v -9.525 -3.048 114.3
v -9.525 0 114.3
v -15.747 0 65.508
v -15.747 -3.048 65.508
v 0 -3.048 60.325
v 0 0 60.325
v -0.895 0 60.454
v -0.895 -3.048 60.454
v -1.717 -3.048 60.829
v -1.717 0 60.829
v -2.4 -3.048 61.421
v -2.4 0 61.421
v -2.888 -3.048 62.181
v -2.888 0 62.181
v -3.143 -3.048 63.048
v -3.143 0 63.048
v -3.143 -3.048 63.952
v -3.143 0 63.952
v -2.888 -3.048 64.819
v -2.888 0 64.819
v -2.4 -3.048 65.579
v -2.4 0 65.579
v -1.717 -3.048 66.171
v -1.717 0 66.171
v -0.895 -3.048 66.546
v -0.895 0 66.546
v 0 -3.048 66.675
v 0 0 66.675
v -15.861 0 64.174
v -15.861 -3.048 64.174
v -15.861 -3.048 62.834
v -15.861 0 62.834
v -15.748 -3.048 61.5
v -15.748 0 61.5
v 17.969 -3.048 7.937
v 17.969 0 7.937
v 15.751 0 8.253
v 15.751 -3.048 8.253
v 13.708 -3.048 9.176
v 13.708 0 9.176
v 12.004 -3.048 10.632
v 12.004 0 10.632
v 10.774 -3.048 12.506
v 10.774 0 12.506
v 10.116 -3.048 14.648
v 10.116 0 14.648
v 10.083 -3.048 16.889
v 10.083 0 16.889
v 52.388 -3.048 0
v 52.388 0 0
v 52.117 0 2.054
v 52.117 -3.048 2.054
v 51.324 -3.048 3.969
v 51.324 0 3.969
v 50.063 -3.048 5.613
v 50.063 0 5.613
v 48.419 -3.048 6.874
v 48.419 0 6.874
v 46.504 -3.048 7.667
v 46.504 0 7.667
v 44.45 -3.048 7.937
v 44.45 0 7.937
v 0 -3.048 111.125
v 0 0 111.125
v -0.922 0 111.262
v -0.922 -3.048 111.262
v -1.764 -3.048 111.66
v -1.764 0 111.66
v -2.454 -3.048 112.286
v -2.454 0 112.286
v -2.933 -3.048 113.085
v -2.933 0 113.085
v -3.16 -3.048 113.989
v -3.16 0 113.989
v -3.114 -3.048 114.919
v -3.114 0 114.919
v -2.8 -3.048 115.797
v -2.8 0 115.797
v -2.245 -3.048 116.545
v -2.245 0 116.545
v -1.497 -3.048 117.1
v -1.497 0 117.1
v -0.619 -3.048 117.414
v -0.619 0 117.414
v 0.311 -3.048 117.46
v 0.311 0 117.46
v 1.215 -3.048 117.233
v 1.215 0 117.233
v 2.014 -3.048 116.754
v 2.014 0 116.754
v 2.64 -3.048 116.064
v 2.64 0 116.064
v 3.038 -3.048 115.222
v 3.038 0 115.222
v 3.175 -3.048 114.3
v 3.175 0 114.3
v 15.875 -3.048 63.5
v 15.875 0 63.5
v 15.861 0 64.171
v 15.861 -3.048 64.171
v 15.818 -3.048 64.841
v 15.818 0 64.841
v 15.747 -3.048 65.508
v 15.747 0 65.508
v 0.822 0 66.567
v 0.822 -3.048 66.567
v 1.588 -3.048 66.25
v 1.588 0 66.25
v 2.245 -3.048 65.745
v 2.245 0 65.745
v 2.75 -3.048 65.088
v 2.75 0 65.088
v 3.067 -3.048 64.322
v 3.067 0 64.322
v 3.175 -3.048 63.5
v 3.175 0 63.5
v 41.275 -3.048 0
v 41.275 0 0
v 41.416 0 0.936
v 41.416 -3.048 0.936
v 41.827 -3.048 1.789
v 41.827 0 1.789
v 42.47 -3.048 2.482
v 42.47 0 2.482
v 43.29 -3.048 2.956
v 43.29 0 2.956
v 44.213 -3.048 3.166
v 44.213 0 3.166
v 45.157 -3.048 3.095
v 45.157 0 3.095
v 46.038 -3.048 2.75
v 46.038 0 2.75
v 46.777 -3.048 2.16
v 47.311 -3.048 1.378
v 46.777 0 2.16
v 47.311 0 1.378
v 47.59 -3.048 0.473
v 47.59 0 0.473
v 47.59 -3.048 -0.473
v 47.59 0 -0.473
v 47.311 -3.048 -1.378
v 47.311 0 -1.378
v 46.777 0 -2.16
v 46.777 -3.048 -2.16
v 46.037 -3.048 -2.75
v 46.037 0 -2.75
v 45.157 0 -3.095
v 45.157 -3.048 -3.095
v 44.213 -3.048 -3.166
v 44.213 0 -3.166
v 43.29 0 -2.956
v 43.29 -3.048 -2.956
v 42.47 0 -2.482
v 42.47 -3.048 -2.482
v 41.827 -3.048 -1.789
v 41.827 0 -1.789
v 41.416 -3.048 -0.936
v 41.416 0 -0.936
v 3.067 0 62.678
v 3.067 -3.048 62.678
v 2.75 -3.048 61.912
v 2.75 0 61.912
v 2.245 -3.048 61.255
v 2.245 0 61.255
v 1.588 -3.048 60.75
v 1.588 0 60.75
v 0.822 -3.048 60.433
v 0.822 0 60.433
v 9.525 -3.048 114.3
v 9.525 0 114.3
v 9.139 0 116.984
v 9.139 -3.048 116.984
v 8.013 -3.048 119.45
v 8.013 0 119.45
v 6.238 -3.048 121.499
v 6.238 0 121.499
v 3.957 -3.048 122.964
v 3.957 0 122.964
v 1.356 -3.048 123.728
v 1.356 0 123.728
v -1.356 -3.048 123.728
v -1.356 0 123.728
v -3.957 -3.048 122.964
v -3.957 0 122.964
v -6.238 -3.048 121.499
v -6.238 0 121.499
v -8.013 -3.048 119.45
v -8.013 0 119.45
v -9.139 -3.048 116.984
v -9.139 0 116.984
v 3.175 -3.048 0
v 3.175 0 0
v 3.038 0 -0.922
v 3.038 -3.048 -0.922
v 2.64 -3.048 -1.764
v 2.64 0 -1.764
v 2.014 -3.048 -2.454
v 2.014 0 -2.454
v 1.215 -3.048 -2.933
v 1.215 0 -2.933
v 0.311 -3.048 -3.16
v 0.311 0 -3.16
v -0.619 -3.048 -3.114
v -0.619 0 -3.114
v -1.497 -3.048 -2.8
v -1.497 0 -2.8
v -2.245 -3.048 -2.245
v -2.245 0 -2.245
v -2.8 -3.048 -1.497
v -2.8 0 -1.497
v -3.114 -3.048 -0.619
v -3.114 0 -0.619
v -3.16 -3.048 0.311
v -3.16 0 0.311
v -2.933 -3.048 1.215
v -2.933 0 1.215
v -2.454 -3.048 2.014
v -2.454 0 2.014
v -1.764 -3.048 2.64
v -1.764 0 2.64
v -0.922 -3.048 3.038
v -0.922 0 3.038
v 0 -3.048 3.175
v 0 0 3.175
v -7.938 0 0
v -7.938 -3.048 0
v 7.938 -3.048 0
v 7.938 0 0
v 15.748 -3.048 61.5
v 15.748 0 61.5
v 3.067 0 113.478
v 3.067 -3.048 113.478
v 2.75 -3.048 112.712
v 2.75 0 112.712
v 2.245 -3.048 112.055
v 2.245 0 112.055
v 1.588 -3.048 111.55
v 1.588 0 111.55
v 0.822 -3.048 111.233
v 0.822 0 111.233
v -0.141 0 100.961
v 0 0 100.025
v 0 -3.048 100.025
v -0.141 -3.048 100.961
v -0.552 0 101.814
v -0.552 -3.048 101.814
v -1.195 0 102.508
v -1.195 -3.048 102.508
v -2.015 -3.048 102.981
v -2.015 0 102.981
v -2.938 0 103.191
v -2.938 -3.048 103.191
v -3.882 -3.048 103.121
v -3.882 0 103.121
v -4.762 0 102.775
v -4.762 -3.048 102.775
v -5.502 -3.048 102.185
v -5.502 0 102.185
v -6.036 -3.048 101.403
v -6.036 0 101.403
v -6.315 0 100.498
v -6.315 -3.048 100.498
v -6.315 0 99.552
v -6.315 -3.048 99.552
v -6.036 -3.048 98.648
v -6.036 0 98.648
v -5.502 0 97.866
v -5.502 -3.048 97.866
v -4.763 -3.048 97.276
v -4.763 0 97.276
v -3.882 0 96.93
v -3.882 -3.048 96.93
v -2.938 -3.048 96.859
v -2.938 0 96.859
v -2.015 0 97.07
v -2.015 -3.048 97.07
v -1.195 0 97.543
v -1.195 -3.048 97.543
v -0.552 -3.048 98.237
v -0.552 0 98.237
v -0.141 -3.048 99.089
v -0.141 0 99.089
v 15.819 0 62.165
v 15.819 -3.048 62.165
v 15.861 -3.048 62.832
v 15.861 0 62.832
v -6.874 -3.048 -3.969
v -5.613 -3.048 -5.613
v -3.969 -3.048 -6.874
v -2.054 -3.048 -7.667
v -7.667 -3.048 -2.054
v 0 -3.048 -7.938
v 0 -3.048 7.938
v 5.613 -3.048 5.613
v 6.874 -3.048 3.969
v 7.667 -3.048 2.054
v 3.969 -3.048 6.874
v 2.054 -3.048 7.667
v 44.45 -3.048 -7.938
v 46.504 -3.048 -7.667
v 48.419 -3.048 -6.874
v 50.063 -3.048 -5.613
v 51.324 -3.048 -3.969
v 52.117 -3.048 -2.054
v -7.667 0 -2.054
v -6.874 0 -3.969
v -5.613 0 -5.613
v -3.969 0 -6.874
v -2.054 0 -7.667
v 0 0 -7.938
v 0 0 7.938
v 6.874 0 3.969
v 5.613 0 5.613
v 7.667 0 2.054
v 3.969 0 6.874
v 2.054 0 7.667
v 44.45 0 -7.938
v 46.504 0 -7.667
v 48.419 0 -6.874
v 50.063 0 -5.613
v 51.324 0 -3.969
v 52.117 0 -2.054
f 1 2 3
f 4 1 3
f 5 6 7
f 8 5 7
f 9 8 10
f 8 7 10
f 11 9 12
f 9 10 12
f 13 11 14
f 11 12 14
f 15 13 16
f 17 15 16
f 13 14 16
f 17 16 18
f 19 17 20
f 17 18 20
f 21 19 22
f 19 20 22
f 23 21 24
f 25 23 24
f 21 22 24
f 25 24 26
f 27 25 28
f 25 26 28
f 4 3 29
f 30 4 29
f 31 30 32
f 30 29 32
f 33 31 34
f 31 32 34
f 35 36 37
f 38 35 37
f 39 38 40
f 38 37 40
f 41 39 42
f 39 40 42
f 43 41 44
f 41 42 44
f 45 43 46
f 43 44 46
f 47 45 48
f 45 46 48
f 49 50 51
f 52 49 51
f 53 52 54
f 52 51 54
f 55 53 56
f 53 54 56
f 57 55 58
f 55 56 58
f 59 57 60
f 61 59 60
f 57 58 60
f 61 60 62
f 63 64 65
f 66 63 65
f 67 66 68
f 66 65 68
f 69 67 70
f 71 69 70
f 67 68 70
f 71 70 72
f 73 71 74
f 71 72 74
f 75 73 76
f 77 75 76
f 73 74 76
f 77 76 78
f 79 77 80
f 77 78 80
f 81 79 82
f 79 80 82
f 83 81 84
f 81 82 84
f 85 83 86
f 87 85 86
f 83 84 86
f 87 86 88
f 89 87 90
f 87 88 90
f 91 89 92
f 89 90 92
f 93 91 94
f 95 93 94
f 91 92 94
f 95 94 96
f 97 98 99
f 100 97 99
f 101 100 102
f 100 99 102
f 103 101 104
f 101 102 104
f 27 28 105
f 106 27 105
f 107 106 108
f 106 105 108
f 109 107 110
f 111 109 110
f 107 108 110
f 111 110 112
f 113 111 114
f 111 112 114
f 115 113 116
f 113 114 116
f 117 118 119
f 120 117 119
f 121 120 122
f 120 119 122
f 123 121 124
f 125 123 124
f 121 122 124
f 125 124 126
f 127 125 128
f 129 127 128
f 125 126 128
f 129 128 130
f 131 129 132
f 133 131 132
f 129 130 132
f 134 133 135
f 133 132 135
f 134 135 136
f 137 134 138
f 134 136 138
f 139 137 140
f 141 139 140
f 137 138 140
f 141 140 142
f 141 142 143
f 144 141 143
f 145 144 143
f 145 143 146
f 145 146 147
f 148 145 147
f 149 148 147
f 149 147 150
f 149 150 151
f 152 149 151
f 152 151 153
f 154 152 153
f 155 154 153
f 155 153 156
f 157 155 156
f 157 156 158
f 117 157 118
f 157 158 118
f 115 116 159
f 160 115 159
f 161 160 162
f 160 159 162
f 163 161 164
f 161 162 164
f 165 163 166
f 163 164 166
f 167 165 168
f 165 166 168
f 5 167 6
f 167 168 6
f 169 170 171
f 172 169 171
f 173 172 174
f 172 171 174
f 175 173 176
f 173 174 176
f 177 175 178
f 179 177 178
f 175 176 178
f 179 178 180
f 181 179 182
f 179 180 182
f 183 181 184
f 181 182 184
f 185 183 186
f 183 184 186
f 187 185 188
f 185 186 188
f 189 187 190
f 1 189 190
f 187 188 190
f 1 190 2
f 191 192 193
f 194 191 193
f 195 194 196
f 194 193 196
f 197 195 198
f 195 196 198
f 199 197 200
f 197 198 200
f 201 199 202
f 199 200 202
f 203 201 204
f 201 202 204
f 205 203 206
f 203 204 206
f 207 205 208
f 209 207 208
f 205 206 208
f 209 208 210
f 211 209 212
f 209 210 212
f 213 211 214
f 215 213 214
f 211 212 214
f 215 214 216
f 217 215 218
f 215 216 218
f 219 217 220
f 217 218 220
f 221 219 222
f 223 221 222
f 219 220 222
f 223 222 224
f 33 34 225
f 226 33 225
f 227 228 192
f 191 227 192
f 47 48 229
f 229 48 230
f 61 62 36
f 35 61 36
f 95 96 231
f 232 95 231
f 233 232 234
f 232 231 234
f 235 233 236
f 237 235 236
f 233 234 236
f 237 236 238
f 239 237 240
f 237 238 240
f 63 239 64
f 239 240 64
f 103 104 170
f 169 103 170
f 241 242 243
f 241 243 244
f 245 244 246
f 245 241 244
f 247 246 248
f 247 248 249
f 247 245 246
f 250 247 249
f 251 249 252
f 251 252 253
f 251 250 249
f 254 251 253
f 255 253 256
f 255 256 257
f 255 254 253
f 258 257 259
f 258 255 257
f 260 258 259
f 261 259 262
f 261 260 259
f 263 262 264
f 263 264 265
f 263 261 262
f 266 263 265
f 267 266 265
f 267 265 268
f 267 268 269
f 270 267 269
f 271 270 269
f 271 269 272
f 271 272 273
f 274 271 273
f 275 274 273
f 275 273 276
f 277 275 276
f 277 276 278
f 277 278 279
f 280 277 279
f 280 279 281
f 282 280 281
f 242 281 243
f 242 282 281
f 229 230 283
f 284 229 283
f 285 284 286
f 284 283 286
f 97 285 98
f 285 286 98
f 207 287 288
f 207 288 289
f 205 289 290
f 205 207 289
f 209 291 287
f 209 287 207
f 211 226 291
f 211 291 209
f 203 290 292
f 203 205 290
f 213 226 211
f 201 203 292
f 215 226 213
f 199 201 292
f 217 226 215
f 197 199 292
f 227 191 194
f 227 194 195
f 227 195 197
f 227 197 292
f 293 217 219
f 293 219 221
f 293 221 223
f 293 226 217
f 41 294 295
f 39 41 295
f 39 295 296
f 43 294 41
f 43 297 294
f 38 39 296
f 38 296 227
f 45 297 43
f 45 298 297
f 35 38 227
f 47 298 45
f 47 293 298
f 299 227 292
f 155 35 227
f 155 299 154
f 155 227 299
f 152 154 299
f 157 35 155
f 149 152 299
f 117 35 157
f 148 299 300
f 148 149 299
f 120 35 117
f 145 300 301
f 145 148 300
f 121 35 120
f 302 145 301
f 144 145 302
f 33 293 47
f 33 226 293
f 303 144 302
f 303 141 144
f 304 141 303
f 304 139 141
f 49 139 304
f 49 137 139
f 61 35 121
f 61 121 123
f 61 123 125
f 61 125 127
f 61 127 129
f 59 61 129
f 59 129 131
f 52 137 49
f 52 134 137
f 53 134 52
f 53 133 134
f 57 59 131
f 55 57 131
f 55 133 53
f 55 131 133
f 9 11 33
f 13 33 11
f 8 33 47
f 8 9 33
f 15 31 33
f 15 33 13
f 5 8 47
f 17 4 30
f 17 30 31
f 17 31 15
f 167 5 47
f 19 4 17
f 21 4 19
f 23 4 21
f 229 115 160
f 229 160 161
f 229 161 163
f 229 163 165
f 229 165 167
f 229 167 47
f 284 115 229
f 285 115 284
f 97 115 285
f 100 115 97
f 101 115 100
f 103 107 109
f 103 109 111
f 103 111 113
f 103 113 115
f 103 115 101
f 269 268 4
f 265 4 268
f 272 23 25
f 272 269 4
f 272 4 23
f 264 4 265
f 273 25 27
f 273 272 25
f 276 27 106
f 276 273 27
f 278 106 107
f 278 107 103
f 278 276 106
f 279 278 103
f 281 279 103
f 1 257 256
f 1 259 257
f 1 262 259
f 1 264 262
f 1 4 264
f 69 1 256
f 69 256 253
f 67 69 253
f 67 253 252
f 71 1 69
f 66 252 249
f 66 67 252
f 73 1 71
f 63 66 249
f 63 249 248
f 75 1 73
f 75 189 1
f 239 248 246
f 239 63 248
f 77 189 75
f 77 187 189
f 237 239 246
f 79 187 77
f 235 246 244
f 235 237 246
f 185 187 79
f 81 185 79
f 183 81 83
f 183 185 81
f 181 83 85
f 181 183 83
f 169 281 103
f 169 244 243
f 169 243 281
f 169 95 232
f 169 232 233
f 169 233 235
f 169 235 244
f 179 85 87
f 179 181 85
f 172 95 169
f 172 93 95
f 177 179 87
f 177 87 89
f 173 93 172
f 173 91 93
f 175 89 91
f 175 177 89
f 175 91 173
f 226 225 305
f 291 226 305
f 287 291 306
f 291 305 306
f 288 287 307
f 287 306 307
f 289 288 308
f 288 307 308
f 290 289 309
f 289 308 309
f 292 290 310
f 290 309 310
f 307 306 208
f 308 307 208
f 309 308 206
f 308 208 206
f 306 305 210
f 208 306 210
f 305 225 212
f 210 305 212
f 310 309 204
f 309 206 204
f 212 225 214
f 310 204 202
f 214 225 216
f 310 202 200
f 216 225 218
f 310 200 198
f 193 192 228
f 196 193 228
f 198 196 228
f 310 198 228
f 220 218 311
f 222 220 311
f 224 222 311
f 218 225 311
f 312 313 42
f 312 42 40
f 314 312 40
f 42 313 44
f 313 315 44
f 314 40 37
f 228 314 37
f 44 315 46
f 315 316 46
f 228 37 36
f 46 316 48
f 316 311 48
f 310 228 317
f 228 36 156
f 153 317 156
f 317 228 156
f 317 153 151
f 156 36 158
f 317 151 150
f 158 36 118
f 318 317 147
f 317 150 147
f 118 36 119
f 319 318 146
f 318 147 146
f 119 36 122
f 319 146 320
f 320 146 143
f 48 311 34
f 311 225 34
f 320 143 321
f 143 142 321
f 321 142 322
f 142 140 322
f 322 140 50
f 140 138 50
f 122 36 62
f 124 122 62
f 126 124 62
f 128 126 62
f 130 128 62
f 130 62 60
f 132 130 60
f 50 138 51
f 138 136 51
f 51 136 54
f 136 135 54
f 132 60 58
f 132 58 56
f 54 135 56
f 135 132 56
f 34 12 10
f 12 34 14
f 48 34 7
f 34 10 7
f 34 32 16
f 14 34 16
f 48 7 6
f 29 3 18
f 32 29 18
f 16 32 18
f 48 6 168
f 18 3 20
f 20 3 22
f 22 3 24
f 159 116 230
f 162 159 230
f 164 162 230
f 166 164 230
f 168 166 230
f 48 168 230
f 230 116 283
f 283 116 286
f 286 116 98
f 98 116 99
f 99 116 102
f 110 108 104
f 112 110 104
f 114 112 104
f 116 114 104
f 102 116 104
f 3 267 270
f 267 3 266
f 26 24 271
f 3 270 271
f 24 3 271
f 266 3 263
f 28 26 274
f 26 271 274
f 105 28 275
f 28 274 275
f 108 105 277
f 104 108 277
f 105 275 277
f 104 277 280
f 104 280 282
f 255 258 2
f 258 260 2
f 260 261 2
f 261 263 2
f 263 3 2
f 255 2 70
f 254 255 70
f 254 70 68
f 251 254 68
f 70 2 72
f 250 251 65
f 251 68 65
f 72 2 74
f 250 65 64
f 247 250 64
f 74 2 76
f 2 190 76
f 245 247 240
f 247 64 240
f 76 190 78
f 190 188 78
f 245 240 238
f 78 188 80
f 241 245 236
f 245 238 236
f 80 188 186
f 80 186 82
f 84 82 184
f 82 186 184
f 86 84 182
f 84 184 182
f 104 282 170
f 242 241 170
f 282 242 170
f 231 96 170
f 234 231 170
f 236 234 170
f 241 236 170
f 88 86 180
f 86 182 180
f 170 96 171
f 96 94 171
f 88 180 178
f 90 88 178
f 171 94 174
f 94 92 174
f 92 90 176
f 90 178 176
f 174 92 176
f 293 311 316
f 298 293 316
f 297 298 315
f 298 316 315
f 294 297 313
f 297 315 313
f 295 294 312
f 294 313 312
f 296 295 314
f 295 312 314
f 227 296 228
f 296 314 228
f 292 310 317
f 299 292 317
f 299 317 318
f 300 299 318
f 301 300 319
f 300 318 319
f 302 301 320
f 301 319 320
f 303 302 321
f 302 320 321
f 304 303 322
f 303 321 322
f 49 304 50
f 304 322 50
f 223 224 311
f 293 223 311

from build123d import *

# Parameters (mm, degrees)
F0_R     = 3.175
F1_DEPTH = 3.048


with BuildPart() as f1:
    # F0 (on Front) → F1 (new body)
    with BuildSketch(Plane.XZ):
        with BuildLine():
            ThreePointArc((3.175, 0), (-2.2450640303, -2.2450640303), (0, 3.175))
            Line((0, 3.175), (0, 7.9375))
            ThreePointArc((0, 7.9375), (-5.6126600757, 5.6126600757), (-7.9375, 0))
            ThreePointArc((-7.9375, 0), (-5.6126600757, -5.6126600757), (0, -7.9375))
            ThreePointArc((0, -7.9375), (5.6126600757, -5.6126600757), (7.9375, 0))
            Line((7.9375, 0), (3.175, 0))
        make_face()
        with BuildLine():
            ThreePointArc((-7.9375, 0), (-5.6126600757, 5.6126600757), (0, 7.9375))
            Line((0, 7.9375), (0, 47.625))
            ThreePointArc((0, 47.625), (-10.4943466753, 51.5884798259), (-15.7484878283, 61.4998109785))
            Line((-15.7484878283, 61.4998109785), (-7.9375, 0))
        make_face()
        with BuildLine():
            Line((0, 47.625), (0, 7.9375))
            ThreePointArc((0, 7.9375), (5.6126600757, 5.6126600757), (7.9375, 0))
            Line((7.9375, 0), (36.5125, 0))
            ThreePointArc((36.5125, 0), (38.8373399243, 5.6126600757), (44.45, 7.9375))
            Line((44.45, 7.9375), (17.969436389, 7.9375))
            ThreePointArc((17.969436389, 7.9375), (12.0041470858, 10.632131185), (10.0825936846, 16.8893946619))
            Line((10.0825936846, 16.8893946619), (15.7484878283, 61.4998109785))
            ThreePointArc((15.7484878283, 61.4998109785), (10.4943466753, 51.5884798259), (0, 47.625))
        make_face()
        with BuildLine():
            Line((36.5125, 0), (7.9375, 0))
            ThreePointArc((7.9375, 0), (5.6126600757, -5.6126600757), (0, -7.9375))
            Line((0, -7.9375), (44.45, -7.9375))
            ThreePointArc((44.45, -7.9375), (38.8373399243, -5.6126600757), (36.5125, 0))
        make_face()
        with BuildLine():
            ThreePointArc((-15.7484878283, 61.4998109785), (-10.4943466753, 51.5884798259), (0, 47.625))
            Line((0, 47.625), (0, 60.325))
            ThreePointArc((0, 60.325), (-3.175, 63.5), (0, 66.675))
            Line((0, 66.675), (0, 79.375))
            ThreePointArc((0, 79.375), (-10.4912828548, 75.4142187767), (-15.7474569047, 65.5082893304))
            ThreePointArc((-15.7474569047, 65.5082893304), (-15.874999475, 63.504082824), (-15.7484878283, 61.4998109785))
        make_face()
        with BuildLine():
            Line((0, 60.325), (0, 47.625))
            ThreePointArc((0, 47.625), (10.4943466753, 51.5884798259), (15.7484878283, 61.4998109785))
            ThreePointArc((15.7484878283, 61.4998109785), (15.8433403876, 62.4979070089), (15.875, 63.5))
            ThreePointArc((15.875, 63.5), (15.8430821396, 64.5061676396), (15.7474569047, 65.5082893304))
            ThreePointArc((15.7474569047, 65.5082893304), (10.4912828548, 75.4142187767), (0, 79.375))
            Line((0, 79.375), (0, 66.675))
            ThreePointArc((0, 66.675), (2.2450640303, 65.7450640303), (3.175, 63.5))
            ThreePointArc((3.175, 63.5), (2.2450640303, 61.2549359697), (0, 60.325))
        make_face()
        with BuildLine():
            ThreePointArc((44.45, 7.9375), (38.8373399243, 5.6126600757), (36.5125, 0))
            ThreePointArc((36.5125, 0), (38.8373399243, -5.6126600757), (44.45, -7.9375))
            ThreePointArc((44.45, -7.9375), (50.0626600757, -5.6126600757), (52.3875, 0))
            ThreePointArc((52.3875, 0), (50.0626600757, 5.6126600757), (44.45, 7.9375))
        make_face()
        with BuildLine():
            ThreePointArc((47.625, 0), (44.45, -3.175), (41.275, 0))
            ThreePointArc((41.275, 0), (44.45, 3.175), (47.625, 0))
        make_face(mode=Mode.SUBTRACT)
        with BuildLine():
            Line((-9.525, 114.3), (-15.7474569047, 65.5082893304))
            ThreePointArc((-15.7474569047, 65.5082893304), (-10.4912828548, 75.4142187767), (0, 79.375))
            Line((0, 79.375), (0, 100.0252))
            Line((0, 100.0252), (0, 104.775))
            ThreePointArc((0, 104.775), (-6.7351920908, 107.5648079092), (-9.525, 114.3))
        make_face()
        with Locations((-3.175, 100.0252)):
            Circle(F0_R, mode=Mode.SUBTRACT)
        with BuildLine():
            Line((0, 100.0252), (0, 79.375))
            ThreePointArc((0, 79.375), (10.4912828548, 75.4142187767), (15.7474569047, 65.5082893304))
            Line((15.7474569047, 65.5082893304), (9.525, 114.3))
            ThreePointArc((9.525, 114.3), (6.7351920908, 107.5648079092), (0, 104.775))
            Line((0, 104.775), (0, 100.0252))
        make_face()
        with BuildLine():
            ThreePointArc((9.525, 114.3), (0, 123.825), (-9.525, 114.3))
            ThreePointArc((-9.525, 114.3), (-6.7351920908, 107.5648079092), (0, 104.775))
            ThreePointArc((0, 104.775), (6.7351920908, 107.5648079092), (9.525, 114.3))
        make_face()
        with BuildLine():
            ThreePointArc((3.175, 114.3), (2.2450640303, 112.0549359697), (0, 111.125))
            ThreePointArc((0, 111.125), (-2.2450640303, 116.5450640303), (3.175, 114.3))
        make_face(mode=Mode.SUBTRACT)
    extrude(amount=F1_DEPTH)


solid = f1.part
